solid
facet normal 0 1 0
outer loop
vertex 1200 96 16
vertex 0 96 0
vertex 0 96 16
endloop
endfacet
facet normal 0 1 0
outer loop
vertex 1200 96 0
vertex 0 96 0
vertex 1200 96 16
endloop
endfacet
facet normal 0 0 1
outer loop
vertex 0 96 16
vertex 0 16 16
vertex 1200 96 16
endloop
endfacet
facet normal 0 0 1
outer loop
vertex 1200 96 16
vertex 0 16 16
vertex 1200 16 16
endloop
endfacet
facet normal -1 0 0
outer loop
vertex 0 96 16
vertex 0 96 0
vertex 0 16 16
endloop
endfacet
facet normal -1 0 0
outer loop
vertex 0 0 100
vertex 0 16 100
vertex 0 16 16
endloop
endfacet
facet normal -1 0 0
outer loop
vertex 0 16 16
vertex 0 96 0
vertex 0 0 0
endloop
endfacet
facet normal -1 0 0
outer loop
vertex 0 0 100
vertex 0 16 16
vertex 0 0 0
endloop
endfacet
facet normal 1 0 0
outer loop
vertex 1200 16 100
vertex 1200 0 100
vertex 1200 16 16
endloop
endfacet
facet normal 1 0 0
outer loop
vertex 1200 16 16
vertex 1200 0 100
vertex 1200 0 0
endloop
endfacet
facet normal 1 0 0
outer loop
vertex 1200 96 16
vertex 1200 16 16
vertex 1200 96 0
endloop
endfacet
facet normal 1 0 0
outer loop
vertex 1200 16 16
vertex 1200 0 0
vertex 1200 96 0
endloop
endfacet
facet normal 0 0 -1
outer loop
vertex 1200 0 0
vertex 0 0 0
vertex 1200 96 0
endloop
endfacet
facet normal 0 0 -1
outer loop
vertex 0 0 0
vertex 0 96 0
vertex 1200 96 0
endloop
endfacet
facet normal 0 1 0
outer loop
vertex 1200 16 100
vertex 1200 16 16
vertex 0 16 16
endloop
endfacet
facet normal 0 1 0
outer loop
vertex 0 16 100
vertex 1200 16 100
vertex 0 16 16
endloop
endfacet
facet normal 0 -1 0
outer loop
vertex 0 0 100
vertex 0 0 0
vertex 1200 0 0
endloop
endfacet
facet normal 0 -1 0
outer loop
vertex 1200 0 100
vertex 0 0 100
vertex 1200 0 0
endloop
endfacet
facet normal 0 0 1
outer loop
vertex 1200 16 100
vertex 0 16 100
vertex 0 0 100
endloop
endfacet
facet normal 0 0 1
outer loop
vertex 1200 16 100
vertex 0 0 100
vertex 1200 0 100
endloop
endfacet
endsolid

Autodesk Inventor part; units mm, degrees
ref_plane "YZ Plane" through (0, 0, 0) normal (1, 0, 0) x (0, 1, 0)
ref_plane "XZ Plane" through (0, 0, 0) normal (0, 1, 0) x (-1, 0, 0)
ref_plane "XY Plane" through (0, 0, 0) normal (0, 0, 1) x (1, 0, 0)
sketch "Sketch1" plane through (0, 0, 0) normal (0, 0, 1) x (1, 0, 0)
  line L0 (0, 0) -> (1200, 0)
  line L1 (1200, 0) -> (1200, 16)
  line L2 (1200, 16) -> (0, 16)
  line L3 (0, 16) -> (0, 0)
  dimension "d0" = 1200
  dimension "d1" = 16
extrude "Extrusion1" add sketch "Sketch1" along normal blind 100
sketch "Sketch2" plane through (0, 16, 0) normal (0, 1, 0) x (1, 0, 0)
  line L0 (1200, 0) -> (0, 0) projected
  line L1 (0, 0) -> (0, -100) projected
  line L2 (1200, -100) -> (0, -100) projected
  line L3 (1200, 0) -> (1200, -100) projected
  line L4 (0, 0) -> (0, -100) projected
  line L5 (1200, 0) -> (0, 0)
  line L6 (0, 0) -> (0, -16)
  line L7 (0, -16) -> (1200, -16)
  line L8 (1200, -16) -> (1200, 0)
  dimension "d4" = 16
extrude "Extrusion2" add sketch "Sketch2" along normal blind 80 contours L3 L7 L1 L0
properties part number "repisa"
